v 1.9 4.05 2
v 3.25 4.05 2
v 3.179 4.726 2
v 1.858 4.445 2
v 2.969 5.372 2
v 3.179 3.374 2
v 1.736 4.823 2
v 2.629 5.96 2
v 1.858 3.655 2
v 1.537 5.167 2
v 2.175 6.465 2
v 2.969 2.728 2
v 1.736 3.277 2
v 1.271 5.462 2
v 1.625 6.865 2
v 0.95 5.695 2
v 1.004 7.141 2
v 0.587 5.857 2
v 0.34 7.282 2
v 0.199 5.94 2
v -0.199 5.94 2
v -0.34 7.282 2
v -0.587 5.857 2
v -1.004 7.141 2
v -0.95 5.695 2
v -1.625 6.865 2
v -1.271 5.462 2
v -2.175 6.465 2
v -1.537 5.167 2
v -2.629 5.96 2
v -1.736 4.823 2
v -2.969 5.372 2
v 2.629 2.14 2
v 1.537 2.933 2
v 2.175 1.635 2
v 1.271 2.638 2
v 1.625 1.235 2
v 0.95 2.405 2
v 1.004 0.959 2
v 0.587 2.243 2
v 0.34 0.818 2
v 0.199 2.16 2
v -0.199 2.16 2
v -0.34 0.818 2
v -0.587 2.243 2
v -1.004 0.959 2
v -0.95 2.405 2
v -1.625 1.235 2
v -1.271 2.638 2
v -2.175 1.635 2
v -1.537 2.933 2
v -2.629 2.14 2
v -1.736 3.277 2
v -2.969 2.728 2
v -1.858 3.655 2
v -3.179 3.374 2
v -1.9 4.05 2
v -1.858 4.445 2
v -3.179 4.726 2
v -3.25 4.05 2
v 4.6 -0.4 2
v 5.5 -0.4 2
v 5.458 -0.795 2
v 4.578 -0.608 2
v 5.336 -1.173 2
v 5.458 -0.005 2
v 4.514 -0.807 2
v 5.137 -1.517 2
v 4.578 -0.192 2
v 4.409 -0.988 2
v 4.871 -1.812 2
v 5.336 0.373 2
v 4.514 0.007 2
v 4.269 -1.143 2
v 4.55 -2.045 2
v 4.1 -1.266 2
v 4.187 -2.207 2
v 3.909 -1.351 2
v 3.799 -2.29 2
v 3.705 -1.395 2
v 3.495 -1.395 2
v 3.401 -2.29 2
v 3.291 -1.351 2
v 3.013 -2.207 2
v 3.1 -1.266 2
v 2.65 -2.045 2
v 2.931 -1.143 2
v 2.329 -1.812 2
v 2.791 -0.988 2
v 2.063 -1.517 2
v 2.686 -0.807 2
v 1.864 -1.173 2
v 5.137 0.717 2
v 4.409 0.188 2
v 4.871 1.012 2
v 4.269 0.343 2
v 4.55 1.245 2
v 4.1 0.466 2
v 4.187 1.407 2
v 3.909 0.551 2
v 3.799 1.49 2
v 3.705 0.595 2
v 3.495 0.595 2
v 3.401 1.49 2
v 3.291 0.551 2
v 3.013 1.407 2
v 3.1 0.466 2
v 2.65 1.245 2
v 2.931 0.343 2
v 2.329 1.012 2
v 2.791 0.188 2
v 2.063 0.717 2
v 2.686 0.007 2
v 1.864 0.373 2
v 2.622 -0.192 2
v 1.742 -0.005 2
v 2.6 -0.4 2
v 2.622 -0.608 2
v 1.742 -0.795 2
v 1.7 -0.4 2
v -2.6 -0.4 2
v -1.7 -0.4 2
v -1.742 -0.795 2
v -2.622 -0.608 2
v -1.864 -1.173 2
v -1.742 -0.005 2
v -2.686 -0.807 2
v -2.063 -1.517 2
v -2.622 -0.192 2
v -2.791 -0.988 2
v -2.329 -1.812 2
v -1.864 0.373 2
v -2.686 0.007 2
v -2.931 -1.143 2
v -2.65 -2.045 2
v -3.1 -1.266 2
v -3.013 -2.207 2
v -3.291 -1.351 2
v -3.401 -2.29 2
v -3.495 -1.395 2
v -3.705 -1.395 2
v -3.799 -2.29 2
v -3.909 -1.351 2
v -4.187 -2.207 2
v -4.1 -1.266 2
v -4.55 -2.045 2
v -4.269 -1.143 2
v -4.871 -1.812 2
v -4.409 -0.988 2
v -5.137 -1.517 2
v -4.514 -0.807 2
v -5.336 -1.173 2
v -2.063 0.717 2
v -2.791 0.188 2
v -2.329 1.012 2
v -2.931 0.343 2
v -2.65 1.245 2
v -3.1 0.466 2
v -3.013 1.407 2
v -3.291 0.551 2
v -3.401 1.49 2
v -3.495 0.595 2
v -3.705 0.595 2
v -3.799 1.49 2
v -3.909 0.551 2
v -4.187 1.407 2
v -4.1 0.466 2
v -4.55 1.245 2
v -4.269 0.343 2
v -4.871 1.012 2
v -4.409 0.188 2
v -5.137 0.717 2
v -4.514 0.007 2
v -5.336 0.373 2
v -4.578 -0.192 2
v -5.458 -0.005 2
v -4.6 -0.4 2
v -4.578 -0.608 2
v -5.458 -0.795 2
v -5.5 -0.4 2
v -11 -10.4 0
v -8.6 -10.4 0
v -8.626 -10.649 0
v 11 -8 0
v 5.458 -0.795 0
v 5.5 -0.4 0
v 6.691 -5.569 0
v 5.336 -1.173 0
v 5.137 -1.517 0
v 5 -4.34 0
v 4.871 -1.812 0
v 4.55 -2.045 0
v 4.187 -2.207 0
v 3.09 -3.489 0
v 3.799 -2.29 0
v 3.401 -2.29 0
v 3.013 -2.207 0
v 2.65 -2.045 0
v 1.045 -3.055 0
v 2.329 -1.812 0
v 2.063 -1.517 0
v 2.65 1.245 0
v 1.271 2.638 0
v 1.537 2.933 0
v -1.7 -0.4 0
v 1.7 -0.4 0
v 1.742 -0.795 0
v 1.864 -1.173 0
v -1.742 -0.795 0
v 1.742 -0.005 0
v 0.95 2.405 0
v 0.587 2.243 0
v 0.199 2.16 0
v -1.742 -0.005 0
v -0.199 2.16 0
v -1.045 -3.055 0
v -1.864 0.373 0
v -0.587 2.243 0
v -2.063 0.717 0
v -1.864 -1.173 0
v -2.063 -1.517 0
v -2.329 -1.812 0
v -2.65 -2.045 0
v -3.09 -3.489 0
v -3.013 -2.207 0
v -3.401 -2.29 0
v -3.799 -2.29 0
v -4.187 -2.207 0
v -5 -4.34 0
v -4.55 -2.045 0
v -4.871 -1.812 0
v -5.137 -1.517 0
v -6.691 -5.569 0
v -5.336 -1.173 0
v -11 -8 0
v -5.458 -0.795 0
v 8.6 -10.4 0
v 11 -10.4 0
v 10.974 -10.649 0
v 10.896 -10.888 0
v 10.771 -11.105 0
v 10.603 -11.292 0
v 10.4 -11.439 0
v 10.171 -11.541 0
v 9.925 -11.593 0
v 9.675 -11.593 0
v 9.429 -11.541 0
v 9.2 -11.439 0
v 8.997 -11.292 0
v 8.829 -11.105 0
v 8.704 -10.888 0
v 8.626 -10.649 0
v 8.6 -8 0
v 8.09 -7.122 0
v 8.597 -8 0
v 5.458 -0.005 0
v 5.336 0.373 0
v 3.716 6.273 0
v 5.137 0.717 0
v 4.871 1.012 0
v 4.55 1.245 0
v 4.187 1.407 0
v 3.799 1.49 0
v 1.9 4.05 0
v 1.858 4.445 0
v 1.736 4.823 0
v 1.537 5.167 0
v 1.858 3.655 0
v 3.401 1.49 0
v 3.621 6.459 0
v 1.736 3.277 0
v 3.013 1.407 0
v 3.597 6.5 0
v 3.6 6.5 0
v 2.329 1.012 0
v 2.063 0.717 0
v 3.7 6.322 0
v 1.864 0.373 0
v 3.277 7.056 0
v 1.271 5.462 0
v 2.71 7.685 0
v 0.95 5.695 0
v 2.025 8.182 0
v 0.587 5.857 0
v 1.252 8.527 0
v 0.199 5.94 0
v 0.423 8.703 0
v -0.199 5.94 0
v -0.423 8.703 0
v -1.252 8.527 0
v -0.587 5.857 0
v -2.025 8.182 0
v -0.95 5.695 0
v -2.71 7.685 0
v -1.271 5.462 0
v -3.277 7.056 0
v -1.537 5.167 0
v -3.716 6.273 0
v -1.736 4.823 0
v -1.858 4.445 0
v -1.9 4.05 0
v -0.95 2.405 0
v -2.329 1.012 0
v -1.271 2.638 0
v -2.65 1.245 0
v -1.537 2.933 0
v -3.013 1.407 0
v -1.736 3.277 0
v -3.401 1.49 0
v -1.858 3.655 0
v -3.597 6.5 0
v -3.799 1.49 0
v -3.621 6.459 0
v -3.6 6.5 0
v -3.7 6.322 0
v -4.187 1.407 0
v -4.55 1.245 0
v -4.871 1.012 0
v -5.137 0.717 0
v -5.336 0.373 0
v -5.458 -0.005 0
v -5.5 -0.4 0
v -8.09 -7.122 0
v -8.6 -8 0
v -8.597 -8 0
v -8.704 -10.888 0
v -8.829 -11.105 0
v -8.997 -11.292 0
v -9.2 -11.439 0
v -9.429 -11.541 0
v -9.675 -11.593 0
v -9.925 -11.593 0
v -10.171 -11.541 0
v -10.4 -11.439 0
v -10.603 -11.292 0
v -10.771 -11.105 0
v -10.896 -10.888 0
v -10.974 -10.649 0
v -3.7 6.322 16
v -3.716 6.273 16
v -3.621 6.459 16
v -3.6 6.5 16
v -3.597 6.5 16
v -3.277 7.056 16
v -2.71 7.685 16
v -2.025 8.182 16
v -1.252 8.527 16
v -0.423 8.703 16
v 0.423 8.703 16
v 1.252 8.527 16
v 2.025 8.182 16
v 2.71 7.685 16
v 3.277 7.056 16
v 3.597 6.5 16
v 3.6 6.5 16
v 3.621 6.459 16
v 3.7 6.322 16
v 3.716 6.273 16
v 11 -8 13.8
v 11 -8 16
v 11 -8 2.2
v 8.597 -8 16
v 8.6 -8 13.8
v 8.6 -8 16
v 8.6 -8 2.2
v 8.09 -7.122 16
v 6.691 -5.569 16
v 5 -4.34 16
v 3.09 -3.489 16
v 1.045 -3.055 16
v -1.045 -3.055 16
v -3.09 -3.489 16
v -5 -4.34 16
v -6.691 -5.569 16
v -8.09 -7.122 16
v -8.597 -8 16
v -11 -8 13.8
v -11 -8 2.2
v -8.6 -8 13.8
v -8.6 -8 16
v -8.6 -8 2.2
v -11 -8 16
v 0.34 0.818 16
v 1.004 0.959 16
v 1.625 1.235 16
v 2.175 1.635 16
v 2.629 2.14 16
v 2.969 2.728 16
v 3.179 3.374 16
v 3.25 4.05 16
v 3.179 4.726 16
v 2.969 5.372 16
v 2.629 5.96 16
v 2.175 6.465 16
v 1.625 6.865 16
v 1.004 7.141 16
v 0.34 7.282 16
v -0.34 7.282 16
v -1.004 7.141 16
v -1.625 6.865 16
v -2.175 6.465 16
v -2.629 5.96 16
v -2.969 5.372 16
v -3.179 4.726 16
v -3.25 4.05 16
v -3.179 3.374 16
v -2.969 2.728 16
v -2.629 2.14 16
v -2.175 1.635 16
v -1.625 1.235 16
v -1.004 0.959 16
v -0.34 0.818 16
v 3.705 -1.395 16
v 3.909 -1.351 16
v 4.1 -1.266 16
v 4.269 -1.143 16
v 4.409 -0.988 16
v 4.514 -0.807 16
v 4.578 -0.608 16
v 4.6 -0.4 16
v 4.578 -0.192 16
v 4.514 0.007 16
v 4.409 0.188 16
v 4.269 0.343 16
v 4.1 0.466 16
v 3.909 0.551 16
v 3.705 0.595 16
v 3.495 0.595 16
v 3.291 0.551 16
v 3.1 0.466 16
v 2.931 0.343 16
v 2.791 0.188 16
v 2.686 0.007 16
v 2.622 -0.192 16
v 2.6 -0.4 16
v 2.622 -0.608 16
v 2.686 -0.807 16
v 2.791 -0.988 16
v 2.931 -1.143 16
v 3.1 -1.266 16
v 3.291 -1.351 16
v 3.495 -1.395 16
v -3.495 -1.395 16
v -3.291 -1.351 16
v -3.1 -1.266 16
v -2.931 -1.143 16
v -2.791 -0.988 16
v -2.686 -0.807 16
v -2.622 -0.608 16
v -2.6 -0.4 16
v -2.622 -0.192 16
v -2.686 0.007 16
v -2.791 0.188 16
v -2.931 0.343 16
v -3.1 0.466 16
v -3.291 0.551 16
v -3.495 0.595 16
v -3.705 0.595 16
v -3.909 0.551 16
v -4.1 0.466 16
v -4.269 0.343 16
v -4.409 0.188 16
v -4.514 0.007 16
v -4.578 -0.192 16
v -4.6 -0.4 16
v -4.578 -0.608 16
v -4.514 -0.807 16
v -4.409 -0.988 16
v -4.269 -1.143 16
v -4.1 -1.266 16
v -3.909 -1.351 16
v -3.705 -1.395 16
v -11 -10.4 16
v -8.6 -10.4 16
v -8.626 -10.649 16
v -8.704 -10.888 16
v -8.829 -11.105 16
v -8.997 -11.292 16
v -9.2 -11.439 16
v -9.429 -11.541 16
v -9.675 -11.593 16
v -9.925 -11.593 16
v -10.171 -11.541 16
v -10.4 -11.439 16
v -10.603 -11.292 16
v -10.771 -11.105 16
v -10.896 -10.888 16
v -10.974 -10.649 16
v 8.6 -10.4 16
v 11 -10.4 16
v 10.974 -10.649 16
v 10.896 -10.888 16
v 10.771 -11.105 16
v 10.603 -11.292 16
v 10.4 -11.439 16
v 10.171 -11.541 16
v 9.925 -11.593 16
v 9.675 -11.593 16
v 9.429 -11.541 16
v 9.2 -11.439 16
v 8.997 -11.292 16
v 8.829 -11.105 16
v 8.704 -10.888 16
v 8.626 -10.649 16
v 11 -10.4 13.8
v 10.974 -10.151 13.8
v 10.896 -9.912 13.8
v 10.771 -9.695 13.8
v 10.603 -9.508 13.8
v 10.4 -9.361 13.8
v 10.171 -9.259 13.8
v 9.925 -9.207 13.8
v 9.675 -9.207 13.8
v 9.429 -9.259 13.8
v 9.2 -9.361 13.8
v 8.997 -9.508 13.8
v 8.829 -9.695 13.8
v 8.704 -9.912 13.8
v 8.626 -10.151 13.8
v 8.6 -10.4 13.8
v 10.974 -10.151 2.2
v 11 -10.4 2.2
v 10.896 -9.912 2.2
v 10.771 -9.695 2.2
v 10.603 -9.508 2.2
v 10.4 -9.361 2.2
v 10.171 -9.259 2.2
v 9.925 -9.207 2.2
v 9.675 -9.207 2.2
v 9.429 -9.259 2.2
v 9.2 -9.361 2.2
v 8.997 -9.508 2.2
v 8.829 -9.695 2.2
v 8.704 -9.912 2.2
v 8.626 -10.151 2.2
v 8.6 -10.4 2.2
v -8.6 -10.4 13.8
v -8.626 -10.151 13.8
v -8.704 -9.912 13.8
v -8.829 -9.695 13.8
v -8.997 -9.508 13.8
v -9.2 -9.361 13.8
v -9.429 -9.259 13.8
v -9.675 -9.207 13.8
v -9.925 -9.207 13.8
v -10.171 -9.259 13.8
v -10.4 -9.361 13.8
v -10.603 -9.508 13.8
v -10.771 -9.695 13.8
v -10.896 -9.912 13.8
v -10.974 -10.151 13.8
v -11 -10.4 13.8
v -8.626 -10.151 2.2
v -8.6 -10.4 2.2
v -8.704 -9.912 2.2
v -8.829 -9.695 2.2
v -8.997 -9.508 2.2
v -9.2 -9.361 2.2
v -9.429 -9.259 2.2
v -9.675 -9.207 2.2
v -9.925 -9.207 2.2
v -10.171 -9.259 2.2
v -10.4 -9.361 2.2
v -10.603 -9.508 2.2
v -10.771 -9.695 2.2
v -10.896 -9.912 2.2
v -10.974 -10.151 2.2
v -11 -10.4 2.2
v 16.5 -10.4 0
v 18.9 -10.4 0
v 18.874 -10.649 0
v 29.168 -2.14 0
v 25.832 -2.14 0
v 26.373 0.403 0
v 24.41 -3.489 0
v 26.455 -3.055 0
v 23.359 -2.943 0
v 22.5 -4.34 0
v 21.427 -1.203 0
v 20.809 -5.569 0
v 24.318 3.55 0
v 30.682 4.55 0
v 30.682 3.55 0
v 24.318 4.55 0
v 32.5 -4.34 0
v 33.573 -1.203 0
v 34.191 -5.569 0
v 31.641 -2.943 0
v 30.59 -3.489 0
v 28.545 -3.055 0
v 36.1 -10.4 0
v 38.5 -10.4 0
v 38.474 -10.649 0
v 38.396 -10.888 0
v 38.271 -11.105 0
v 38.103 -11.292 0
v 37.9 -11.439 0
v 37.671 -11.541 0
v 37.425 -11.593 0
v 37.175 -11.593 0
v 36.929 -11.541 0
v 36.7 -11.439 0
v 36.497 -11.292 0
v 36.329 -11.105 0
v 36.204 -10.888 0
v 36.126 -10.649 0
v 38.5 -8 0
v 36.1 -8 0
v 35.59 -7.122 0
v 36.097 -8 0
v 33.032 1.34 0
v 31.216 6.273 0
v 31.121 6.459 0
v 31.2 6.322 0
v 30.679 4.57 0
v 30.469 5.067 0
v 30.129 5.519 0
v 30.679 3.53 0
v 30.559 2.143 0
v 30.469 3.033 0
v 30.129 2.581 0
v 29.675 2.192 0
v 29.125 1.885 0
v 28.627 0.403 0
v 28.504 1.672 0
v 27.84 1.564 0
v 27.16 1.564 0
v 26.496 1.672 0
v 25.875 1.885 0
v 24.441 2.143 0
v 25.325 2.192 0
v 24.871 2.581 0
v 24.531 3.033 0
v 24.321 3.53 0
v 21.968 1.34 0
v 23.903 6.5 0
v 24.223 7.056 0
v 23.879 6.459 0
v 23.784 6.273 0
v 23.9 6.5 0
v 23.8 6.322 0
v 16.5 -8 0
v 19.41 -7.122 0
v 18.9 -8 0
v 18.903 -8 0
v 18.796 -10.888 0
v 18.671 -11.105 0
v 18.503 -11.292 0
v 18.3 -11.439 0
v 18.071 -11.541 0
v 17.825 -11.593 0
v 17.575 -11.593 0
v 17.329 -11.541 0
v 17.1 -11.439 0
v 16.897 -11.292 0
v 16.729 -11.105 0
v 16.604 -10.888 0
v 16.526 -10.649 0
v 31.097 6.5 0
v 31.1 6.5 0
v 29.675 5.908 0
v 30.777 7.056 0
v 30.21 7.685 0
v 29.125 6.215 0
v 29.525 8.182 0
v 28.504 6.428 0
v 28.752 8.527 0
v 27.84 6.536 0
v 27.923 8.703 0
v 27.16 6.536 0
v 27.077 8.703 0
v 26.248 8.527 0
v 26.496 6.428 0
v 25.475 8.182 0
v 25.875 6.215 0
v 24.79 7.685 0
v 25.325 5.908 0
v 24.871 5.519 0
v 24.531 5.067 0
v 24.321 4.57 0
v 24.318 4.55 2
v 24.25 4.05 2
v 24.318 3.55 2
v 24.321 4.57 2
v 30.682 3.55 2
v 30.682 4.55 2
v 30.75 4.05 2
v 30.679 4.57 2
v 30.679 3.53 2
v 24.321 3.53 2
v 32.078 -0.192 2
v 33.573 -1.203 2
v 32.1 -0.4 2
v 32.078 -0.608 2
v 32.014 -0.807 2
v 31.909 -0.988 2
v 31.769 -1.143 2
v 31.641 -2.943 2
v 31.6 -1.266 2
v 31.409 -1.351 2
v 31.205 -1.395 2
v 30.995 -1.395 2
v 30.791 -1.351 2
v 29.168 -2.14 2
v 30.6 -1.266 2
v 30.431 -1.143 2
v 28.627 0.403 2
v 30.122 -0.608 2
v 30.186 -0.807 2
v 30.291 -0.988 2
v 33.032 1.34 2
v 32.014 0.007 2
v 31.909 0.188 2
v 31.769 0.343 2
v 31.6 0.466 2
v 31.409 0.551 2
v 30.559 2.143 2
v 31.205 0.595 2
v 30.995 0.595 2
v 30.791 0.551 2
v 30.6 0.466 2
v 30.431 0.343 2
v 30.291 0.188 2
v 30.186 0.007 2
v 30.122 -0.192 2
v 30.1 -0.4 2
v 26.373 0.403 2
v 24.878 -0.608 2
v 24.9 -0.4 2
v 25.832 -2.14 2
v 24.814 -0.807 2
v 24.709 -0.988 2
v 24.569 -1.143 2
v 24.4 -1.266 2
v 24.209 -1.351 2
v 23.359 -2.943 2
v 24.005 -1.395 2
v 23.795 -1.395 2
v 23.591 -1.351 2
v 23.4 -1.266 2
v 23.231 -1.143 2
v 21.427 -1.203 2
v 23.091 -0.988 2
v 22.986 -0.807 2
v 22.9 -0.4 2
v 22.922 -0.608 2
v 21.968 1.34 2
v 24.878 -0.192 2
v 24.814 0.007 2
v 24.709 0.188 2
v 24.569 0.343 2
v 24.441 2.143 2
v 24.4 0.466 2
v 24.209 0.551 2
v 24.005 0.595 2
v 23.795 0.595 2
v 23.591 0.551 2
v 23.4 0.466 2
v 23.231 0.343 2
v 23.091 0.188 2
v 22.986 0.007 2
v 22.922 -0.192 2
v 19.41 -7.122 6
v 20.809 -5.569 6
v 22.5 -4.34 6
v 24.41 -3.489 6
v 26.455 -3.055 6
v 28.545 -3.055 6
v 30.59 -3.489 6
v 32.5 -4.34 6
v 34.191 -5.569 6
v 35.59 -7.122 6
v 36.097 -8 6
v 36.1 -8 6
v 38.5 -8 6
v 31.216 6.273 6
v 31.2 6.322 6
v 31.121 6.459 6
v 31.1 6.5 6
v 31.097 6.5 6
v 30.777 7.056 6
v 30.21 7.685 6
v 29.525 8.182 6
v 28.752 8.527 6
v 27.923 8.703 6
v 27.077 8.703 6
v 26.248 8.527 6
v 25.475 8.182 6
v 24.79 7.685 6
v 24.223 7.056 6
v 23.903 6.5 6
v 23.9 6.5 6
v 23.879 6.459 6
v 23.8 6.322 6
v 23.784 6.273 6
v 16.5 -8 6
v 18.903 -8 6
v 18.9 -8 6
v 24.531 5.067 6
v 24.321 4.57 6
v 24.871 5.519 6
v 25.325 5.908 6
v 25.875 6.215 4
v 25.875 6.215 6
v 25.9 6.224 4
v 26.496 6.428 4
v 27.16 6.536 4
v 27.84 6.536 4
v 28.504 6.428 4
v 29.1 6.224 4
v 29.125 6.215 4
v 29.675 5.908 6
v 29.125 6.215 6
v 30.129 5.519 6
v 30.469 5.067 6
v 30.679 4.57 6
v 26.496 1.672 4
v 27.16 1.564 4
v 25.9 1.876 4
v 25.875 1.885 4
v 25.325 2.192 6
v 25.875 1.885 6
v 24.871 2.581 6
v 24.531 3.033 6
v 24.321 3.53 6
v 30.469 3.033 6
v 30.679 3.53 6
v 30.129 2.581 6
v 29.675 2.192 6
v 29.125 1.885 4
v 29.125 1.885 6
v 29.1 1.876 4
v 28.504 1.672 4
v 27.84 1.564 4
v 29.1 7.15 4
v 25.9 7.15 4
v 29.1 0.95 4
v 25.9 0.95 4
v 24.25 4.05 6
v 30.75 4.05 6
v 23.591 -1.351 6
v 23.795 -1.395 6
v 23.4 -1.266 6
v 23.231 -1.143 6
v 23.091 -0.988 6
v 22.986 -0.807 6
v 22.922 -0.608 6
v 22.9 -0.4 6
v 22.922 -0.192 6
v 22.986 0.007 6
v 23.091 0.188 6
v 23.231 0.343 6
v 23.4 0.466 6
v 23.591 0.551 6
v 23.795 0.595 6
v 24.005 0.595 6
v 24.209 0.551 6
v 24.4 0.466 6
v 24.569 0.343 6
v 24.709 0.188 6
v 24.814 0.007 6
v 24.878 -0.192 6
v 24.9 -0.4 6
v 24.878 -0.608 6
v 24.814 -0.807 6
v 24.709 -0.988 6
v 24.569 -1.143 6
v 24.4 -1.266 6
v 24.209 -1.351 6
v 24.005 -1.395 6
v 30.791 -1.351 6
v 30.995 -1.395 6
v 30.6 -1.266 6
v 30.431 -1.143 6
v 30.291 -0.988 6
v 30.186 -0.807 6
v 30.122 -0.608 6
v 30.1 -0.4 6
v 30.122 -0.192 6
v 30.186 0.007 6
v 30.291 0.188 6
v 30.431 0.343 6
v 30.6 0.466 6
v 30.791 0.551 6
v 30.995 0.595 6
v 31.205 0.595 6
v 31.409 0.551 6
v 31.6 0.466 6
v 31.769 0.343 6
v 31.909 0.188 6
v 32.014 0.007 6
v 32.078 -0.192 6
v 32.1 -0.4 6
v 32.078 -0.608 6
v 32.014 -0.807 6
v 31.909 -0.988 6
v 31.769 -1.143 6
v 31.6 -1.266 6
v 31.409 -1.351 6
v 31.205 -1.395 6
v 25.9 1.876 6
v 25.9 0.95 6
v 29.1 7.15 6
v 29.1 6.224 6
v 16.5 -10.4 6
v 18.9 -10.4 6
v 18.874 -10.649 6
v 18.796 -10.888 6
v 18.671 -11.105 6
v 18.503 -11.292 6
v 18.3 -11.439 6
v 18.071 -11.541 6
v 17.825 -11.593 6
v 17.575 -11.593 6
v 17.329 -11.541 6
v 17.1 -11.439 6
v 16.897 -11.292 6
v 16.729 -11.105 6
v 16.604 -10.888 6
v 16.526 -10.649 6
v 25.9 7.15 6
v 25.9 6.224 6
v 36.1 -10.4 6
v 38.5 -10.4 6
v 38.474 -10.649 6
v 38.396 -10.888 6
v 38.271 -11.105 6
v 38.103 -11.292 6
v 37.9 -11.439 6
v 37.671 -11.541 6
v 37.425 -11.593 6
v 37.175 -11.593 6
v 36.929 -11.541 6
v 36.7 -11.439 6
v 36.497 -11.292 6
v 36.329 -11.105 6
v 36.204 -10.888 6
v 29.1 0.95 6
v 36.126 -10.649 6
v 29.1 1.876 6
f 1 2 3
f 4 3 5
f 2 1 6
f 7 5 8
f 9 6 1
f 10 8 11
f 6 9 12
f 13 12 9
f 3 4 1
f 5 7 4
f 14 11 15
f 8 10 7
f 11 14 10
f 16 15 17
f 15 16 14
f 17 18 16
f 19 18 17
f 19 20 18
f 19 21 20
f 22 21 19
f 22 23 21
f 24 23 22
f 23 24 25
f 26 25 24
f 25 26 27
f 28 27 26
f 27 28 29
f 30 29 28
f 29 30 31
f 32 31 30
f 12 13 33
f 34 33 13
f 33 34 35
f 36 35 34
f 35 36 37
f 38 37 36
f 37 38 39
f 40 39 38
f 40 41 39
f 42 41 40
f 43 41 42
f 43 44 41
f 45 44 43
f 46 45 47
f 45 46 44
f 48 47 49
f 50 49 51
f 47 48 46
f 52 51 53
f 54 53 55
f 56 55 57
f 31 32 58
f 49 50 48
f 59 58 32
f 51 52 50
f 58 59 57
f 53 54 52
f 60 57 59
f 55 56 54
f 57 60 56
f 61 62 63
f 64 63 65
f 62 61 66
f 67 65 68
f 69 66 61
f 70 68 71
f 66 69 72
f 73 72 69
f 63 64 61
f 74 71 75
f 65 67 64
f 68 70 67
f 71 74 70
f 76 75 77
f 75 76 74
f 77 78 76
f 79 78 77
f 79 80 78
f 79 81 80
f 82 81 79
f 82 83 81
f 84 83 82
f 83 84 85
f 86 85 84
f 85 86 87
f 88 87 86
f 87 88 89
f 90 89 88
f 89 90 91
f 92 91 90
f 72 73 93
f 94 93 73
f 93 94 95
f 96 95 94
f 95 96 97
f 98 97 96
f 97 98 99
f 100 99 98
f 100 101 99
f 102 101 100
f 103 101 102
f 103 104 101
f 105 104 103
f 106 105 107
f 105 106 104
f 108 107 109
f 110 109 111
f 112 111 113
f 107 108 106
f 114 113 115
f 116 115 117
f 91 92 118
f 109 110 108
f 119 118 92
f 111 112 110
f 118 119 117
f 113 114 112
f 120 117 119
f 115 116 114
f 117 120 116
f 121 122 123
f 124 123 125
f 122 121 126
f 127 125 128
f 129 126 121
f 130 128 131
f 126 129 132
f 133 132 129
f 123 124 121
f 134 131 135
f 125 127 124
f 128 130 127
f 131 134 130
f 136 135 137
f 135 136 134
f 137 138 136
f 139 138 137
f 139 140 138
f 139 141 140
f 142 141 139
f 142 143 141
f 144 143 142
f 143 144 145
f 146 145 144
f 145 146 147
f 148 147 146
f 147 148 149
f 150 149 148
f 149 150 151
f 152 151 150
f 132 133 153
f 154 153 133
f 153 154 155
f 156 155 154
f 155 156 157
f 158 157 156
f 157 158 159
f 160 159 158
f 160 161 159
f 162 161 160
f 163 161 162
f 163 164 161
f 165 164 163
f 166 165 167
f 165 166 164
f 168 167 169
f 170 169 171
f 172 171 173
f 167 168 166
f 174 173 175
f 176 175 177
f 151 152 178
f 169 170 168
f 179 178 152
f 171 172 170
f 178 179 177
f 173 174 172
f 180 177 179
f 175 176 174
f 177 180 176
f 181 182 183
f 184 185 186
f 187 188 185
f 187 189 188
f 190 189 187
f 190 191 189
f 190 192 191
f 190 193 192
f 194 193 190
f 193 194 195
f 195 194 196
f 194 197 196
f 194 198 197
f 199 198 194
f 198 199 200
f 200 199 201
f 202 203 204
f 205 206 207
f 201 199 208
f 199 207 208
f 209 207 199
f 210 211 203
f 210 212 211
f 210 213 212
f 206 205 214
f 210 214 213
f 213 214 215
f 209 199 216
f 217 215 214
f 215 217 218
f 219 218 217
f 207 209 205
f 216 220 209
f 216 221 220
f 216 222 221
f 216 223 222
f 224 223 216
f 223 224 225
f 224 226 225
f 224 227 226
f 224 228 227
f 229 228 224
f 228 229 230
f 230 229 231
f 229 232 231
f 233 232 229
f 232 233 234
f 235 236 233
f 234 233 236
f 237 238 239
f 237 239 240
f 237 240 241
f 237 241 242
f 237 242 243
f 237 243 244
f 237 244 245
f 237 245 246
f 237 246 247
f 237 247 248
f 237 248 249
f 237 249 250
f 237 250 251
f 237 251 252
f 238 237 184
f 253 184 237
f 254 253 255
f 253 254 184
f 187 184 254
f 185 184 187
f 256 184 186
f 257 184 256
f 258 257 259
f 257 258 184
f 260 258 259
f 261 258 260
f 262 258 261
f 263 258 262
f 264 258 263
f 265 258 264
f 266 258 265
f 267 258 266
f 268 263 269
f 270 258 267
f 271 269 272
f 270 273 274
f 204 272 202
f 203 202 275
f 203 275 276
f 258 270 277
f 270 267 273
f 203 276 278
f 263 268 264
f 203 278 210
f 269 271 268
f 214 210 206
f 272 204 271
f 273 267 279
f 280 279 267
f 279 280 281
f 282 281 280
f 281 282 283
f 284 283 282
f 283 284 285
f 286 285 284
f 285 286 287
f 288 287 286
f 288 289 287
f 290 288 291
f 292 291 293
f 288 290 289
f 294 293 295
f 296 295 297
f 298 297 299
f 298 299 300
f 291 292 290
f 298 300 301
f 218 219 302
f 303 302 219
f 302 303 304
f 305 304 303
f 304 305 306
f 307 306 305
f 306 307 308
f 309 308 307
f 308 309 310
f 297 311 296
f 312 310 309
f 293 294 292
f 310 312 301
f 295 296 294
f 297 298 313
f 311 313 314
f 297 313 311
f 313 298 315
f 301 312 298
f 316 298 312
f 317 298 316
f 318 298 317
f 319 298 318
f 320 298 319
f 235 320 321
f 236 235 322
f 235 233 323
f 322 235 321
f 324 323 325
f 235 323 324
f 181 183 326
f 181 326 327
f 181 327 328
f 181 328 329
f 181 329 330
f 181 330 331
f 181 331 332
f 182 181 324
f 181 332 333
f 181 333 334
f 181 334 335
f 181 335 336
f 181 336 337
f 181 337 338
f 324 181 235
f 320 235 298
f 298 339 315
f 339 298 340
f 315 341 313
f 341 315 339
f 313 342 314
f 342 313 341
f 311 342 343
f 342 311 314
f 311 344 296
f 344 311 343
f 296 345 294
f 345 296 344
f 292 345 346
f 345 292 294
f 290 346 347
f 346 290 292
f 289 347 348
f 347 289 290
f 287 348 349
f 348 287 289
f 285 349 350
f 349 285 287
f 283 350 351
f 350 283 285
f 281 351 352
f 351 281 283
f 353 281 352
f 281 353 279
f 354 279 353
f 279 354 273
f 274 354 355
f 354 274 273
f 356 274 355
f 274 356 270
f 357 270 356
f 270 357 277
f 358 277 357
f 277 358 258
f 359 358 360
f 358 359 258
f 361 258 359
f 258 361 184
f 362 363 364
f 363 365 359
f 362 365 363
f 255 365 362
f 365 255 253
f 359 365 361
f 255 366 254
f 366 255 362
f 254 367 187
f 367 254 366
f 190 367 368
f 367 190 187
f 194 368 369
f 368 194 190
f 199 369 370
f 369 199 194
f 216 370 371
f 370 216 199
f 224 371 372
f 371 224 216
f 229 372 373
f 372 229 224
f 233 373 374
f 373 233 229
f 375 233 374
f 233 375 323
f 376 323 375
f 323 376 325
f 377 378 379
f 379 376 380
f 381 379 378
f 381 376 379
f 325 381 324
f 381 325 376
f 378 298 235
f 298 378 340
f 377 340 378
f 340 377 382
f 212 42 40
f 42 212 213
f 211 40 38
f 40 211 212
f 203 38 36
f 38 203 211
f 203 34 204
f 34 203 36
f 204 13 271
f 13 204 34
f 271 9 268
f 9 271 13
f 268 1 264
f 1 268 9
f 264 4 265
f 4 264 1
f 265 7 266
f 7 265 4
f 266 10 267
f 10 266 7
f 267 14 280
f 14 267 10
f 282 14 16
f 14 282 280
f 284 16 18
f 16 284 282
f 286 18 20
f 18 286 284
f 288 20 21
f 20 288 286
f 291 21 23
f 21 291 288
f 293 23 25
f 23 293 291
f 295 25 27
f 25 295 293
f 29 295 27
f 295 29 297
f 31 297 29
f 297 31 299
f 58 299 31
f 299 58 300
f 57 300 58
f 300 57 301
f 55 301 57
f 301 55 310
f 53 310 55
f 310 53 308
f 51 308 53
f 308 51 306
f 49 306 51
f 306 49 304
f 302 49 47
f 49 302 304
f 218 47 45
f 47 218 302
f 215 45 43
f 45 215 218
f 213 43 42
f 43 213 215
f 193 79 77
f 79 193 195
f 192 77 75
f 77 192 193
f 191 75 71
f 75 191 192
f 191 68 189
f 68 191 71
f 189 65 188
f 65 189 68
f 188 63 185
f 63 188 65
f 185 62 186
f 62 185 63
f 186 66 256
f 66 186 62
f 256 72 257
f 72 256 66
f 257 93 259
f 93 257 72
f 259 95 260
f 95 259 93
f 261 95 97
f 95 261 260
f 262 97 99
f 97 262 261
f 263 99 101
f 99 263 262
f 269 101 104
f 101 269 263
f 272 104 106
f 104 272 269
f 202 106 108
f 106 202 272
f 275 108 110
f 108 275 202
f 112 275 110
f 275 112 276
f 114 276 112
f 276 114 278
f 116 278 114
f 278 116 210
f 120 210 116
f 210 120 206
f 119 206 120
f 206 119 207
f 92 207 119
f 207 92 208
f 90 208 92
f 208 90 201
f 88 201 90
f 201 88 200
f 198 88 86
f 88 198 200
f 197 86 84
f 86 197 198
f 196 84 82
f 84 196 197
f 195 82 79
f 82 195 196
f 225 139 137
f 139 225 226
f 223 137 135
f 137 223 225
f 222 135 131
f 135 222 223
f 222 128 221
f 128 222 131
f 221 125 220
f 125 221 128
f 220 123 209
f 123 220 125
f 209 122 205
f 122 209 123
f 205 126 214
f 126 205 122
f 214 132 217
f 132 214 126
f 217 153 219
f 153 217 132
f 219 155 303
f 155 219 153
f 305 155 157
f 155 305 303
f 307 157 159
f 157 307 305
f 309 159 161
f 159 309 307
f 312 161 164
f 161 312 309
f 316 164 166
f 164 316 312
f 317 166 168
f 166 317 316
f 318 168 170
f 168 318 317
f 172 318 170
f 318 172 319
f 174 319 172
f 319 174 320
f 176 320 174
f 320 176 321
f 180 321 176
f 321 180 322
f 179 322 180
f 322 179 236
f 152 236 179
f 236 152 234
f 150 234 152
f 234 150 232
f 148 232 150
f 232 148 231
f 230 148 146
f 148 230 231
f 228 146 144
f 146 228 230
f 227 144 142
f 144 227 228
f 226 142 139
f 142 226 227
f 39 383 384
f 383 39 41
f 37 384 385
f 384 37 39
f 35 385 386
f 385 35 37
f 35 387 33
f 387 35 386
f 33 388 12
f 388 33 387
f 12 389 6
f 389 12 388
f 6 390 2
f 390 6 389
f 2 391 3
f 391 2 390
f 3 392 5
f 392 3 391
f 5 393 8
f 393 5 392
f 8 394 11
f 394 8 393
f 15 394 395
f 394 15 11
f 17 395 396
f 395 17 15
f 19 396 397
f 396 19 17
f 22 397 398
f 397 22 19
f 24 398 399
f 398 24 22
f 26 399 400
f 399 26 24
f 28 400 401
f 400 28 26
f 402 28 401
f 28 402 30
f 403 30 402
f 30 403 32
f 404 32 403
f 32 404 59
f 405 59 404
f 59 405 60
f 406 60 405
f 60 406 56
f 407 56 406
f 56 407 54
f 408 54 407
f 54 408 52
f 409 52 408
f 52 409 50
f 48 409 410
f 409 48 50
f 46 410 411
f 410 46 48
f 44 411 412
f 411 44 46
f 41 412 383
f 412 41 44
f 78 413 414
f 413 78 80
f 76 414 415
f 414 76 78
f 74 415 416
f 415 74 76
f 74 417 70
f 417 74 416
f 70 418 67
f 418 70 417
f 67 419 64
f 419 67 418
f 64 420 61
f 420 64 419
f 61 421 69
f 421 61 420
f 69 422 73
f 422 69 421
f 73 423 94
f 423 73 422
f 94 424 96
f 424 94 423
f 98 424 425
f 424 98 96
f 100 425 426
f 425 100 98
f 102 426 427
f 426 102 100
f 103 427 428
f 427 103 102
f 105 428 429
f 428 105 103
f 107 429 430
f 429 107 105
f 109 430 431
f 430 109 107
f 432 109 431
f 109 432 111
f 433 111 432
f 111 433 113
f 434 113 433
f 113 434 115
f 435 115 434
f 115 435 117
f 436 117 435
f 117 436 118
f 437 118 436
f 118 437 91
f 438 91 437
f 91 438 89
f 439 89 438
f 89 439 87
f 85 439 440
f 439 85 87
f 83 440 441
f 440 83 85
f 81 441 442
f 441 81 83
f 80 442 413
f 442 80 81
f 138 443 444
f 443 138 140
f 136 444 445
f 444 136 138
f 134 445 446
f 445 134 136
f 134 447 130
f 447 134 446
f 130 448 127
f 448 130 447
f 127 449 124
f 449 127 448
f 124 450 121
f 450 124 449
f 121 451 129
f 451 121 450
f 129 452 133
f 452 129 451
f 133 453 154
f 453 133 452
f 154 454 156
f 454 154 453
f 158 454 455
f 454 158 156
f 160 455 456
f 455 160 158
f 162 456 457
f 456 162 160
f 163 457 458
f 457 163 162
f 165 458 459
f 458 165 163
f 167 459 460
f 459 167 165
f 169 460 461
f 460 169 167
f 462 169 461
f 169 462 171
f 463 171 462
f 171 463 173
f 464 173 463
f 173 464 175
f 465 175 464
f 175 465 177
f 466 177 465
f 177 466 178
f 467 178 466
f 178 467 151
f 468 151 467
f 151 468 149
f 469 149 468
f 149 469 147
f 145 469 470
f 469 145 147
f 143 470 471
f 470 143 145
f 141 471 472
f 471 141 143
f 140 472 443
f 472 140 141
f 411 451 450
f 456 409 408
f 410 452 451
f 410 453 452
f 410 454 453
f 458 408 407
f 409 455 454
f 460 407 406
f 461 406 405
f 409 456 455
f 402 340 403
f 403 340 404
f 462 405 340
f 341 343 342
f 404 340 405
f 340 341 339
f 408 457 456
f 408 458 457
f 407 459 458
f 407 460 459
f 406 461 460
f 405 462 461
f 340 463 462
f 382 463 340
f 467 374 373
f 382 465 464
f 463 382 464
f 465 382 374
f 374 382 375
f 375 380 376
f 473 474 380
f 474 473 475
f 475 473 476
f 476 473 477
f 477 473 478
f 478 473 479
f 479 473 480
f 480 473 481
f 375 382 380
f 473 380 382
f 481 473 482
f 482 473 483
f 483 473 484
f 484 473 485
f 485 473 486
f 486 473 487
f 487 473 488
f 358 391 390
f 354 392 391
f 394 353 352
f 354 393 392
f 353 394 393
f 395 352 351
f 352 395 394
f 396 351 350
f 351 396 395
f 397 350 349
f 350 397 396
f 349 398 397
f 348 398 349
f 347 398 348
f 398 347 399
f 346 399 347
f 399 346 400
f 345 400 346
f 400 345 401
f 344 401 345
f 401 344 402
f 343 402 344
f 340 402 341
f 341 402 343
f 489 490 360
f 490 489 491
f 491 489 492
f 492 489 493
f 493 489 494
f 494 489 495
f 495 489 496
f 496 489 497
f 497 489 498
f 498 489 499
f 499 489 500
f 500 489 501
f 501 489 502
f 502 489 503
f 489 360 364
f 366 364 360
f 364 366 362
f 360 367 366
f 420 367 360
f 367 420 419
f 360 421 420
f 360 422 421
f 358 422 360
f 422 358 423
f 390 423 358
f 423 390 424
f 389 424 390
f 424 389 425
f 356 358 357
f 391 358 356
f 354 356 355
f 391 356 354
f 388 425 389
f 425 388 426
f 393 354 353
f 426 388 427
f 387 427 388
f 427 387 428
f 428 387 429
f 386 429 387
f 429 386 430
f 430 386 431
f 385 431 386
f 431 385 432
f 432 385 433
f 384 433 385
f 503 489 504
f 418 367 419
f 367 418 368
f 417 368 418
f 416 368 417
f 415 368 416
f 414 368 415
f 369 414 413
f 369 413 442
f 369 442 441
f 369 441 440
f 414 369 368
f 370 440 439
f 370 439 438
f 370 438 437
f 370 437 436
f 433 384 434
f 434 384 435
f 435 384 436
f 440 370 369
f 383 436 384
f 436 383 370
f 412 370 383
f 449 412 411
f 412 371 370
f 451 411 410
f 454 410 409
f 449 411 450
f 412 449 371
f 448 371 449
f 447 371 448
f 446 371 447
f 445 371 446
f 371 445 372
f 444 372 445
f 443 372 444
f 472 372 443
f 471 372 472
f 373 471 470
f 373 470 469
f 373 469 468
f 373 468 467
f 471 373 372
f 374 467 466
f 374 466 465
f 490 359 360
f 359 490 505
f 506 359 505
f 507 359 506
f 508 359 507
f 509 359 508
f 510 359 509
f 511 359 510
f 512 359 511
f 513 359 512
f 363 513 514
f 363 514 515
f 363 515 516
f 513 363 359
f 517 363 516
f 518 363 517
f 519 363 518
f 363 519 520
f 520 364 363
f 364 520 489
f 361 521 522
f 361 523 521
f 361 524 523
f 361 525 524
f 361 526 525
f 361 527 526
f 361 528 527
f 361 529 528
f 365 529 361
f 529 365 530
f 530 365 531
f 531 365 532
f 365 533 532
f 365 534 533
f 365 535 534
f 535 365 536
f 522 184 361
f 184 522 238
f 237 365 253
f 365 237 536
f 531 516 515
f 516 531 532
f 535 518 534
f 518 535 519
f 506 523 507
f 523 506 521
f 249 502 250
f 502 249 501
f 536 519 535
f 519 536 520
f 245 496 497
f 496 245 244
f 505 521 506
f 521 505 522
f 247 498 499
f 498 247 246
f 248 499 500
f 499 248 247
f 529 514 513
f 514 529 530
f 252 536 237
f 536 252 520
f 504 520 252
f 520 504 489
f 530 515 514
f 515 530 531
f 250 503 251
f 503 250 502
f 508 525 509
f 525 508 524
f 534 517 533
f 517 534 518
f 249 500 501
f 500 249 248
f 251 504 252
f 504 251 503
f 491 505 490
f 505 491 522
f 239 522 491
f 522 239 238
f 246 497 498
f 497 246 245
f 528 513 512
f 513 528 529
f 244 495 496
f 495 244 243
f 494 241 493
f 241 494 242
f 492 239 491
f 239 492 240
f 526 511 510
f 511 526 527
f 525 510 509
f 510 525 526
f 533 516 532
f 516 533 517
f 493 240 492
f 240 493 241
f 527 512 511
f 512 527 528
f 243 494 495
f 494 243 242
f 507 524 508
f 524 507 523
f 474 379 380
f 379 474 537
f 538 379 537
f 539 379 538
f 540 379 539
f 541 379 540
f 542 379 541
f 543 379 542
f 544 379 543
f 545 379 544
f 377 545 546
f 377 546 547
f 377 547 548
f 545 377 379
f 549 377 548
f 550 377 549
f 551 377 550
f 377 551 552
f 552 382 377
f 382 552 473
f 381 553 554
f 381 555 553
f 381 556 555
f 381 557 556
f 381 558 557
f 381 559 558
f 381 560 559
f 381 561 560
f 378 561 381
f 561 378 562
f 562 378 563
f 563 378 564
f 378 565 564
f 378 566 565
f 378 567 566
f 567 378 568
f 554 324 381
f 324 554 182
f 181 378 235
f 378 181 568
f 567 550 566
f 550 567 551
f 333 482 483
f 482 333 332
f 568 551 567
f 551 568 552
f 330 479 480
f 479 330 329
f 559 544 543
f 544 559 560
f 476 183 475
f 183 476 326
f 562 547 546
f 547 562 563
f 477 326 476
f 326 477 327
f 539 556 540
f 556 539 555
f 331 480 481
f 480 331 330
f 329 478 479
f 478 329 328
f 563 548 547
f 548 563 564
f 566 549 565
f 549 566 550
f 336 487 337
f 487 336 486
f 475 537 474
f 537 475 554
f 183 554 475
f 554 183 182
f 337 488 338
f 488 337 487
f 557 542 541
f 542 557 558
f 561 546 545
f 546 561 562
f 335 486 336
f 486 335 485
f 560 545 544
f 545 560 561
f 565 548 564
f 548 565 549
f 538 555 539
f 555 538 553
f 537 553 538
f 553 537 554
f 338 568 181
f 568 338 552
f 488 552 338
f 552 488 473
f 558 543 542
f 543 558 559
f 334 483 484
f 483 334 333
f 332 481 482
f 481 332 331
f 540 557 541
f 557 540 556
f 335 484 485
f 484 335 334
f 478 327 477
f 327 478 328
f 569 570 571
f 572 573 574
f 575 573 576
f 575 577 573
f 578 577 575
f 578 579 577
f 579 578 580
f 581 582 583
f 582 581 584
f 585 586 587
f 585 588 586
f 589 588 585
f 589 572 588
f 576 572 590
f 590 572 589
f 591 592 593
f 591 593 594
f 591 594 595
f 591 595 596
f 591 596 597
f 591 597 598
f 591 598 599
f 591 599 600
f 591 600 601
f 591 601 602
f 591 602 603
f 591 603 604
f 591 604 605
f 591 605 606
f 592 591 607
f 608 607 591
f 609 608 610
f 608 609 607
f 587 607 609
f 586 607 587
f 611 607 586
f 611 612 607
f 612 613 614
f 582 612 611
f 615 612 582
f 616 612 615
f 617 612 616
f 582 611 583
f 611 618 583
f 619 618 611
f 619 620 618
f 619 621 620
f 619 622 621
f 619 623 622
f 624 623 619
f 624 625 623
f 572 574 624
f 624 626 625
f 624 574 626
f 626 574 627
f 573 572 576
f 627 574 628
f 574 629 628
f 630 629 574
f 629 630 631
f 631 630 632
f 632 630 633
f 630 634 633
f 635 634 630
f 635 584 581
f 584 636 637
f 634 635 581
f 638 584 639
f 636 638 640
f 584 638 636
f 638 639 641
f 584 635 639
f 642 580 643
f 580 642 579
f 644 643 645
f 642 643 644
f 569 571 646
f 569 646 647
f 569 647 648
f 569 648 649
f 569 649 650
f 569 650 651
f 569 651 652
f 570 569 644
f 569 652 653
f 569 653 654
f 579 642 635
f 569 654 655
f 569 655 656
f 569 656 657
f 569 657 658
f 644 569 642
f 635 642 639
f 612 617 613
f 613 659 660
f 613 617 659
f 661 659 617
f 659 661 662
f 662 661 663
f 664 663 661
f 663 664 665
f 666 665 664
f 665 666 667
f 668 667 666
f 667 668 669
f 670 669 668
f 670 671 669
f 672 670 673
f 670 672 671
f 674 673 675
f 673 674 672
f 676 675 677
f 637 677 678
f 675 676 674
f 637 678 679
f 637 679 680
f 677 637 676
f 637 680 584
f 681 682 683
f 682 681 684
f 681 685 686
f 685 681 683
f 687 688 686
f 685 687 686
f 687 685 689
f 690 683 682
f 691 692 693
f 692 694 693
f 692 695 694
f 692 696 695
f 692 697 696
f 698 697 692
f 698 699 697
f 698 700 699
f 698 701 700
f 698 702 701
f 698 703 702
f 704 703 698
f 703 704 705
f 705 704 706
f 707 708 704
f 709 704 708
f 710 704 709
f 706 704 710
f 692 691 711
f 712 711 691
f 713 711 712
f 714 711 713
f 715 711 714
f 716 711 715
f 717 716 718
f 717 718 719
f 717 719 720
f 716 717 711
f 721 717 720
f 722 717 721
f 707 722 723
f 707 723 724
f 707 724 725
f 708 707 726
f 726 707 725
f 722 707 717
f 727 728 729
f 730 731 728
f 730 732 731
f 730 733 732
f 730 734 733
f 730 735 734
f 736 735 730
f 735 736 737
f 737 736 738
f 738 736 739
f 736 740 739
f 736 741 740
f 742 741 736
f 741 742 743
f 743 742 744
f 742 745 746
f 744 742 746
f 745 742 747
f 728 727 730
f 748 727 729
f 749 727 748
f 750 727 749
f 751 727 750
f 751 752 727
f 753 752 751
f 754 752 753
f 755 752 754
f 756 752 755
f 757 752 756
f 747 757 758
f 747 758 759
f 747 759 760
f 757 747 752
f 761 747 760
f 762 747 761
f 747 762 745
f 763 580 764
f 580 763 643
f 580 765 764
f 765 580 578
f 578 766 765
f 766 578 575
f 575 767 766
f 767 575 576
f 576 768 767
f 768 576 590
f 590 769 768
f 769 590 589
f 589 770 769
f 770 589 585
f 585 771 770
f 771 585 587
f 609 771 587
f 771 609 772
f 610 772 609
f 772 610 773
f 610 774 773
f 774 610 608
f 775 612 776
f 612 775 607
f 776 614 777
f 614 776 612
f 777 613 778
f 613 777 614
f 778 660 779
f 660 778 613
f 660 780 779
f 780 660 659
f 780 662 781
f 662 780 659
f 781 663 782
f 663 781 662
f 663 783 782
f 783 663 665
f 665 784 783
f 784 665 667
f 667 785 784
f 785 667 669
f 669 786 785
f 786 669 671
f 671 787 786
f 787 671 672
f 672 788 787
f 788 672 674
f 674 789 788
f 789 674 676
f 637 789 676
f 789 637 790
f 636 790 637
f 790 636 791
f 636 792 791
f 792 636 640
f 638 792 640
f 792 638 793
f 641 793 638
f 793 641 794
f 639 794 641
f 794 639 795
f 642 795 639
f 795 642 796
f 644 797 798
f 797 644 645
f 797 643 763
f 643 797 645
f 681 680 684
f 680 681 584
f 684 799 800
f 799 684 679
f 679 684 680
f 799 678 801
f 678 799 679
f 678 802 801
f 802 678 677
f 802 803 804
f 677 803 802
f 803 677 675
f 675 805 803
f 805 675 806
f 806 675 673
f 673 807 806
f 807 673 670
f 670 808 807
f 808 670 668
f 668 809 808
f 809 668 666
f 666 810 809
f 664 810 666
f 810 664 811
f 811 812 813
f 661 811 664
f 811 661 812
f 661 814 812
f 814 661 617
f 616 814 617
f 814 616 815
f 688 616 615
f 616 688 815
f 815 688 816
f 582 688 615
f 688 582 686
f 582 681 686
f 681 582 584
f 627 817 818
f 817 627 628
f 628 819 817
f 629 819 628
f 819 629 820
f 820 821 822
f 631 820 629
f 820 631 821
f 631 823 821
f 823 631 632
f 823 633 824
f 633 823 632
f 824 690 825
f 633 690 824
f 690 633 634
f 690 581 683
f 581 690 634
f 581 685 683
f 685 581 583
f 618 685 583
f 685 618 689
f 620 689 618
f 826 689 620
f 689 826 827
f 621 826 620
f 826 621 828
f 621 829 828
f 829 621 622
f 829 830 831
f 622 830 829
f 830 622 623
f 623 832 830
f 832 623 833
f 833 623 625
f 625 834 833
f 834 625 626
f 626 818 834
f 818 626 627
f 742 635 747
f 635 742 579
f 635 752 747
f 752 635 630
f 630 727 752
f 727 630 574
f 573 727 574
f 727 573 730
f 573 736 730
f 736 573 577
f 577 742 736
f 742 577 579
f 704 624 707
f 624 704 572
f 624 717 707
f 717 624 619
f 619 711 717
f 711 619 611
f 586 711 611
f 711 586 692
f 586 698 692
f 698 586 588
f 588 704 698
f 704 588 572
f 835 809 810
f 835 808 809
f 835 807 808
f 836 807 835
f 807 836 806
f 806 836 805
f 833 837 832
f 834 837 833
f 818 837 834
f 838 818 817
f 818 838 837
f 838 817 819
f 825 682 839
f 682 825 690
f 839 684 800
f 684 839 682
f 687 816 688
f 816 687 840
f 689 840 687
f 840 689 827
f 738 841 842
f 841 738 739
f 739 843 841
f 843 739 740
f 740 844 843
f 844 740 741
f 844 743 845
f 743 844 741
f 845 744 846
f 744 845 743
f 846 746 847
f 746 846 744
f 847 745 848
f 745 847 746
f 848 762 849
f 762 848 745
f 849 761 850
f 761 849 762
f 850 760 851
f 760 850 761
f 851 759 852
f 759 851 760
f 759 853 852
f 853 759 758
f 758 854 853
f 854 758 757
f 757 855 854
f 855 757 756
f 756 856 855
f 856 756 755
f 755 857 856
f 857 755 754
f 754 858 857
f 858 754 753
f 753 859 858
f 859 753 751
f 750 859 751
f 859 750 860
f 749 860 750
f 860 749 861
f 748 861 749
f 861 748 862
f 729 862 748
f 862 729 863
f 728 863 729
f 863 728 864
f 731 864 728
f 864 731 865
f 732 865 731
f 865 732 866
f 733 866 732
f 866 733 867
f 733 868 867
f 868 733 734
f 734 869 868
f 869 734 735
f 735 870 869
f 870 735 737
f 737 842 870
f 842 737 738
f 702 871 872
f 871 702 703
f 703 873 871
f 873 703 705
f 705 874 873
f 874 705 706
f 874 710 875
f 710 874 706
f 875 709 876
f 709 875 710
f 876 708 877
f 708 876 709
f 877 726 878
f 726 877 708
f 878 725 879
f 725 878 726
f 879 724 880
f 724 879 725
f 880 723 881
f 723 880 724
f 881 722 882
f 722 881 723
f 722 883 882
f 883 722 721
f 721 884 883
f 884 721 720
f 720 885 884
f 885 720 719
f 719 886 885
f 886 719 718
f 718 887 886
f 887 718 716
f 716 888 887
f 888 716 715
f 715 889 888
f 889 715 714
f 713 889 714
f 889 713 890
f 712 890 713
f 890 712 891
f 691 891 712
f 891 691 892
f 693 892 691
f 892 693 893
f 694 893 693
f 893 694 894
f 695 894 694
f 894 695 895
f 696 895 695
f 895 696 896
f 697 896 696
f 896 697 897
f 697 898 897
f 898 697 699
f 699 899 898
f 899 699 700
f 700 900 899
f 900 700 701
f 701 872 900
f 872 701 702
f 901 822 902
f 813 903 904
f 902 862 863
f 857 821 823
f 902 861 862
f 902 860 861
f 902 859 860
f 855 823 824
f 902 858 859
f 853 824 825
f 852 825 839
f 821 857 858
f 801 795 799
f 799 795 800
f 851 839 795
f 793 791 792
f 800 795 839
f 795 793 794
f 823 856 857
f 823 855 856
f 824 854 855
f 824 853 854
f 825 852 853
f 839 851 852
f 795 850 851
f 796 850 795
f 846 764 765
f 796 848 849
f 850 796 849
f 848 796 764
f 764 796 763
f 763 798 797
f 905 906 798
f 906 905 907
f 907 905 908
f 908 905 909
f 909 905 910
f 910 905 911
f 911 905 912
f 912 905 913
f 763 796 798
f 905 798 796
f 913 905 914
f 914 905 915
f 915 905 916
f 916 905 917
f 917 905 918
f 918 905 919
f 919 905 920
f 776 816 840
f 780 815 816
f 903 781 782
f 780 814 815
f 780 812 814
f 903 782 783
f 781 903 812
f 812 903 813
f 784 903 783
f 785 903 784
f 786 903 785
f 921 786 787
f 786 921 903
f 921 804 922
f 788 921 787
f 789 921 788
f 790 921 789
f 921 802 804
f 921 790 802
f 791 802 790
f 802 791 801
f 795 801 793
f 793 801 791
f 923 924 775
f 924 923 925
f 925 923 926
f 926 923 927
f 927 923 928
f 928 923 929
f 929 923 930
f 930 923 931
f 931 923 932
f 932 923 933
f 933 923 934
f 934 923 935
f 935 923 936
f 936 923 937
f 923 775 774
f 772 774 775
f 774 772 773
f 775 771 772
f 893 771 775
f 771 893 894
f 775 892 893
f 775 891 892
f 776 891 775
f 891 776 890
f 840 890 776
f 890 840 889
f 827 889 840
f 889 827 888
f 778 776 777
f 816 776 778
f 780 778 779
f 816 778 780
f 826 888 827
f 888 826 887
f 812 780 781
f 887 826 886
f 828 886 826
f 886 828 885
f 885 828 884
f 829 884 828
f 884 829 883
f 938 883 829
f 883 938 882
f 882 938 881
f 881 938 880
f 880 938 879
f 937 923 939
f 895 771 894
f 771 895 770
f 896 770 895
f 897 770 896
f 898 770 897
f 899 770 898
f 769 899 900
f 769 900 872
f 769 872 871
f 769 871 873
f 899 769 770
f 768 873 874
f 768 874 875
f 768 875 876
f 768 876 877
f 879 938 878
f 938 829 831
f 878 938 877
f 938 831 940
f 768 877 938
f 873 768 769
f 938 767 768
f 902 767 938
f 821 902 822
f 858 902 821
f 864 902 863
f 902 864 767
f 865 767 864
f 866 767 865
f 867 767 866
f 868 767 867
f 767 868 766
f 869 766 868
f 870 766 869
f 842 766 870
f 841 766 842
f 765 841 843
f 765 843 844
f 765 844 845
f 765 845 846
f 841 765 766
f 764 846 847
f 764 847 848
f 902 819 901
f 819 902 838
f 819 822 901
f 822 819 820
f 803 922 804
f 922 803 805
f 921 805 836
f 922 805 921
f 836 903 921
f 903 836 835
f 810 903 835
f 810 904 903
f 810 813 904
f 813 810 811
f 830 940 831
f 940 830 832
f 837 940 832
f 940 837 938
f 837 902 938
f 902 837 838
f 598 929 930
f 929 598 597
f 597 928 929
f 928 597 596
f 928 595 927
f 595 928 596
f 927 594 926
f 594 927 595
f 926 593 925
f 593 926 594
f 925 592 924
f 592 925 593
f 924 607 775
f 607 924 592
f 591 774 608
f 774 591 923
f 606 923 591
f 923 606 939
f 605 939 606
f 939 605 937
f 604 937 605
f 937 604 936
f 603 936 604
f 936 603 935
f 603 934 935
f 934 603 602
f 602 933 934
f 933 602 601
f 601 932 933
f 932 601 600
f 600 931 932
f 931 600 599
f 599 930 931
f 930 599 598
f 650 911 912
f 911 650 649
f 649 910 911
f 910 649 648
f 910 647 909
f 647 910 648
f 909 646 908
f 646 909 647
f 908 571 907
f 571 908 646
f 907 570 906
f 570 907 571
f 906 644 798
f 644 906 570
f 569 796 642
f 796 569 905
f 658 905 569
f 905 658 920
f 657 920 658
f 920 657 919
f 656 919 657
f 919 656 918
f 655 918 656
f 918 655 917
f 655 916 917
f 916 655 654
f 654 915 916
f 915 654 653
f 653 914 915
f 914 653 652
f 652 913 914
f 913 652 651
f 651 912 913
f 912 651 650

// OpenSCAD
//2020-09-16
//Laserclaw.scad
//https://github.com/degenerator0/
//https://www.instructables.com/member/degenerator0/
//https://www.thingiverse.com/degenerator/
//Laser diode chassis for Laserclaw project


$fs=.01;
LASERADJUST=2;
M1BOTTOMADJUST_X=3.6;
M1BOTTOMADJUST_Y=-.4;
BOTTOMCIRCLE=10;
BOTTOMCIRCLEADJUST=-13;
EDGECIRCLE=1;
POLYGON_X=3.6;
POLYGON_Y=6.5;
TRAPEZOID_X=11;
TRAPEZOID_Y=-8;
TOPCIRCLE=POLYGON_Y/2+.8;
TOPCIRCLEADJUST=POLYGON_Y/4+1.8;
FRONT_H=16;


module laserfront (){
    hole0_d=3.8;
    hole1_d=3.8;
    hole2_d=6.5;
    screwhead_d=3.8;
    segment0_h=2;
    segment1_h=2;
    segment2_h=12;
    total_h=segment0_h+segment1_h+segment2_h;
    strap_x=2.4;
    strap_y=2.4;
    strap_z=2.2;
    
    union () {
        //segment0
        translate ([0,0,segment1_h+segment2_h])
            linear_extrude(height = segment0_h) {
                difference (){
                    union () {
                        
                        //rounded top
                        translate ([0,2*TOPCIRCLE-TOPCIRCLEADJUST]) circle (TOPCIRCLE);
                        
                        //trapezoid base
                        polygon ([
                            [-POLYGON_X,POLYGON_Y],
                            [POLYGON_X,POLYGON_Y],
                            [TRAPEZOID_X, TRAPEZOID_Y],
                            [-TRAPEZOID_X, TRAPEZOID_Y]]);  
                    
                        }
                        
                //cutouts
                    //laser module hole
                    translate ([0,LASERADJUST*TOPCIRCLE/2]) circle (hole0_d/2);
                        
                    //finger curvature
                    translate ([0,BOTTOMCIRCLEADJUST]) circle (BOTTOMCIRCLE);
                    
                    //m2 screwhead - left
                    translate ([-M1BOTTOMADJUST_X,M1BOTTOMADJUST_Y]) circle(screwhead_d/2);
                        
                    //m2 screwhead - right
                    translate ([M1BOTTOMADJUST_X,M1BOTTOMADJUST_Y]) circle(screwhead_d/2);
                }
            }   
        //segment 1
        translate ([0,0,segment2_h])
            linear_extrude(height = segment1_h) {
                difference (){
                    union () {
                        
                        //rounded top
                        translate ([0,2*TOPCIRCLE-TOPCIRCLEADJUST]) circle (TOPCIRCLE);
                        
                        //trapezoid base
                        polygon ([
                            [-POLYGON_X,POLYGON_Y],
                            [POLYGON_X,POLYGON_Y],
                            [TRAPEZOID_X, TRAPEZOID_Y],
                            [-TRAPEZOID_X, TRAPEZOID_Y]]);  
                   
                        }
                //cutouts
                    //laser module hole
                    translate ([0,LASERADJUST*TOPCIRCLE/2]) circle (hole2_d/2);
                    
                    //finger curvature
                    translate ([0,BOTTOMCIRCLEADJUST]) circle (BOTTOMCIRCLE);
                    
                    //m2 screw - left
                    translate ([-M1BOTTOMADJUST_X,M1BOTTOMADJUST_Y]) circle(1);
                    
                    //m2 screw - RIGHT
                    translate ([M1BOTTOMADJUST_X,M1BOTTOMADJUST_Y]) circle(1);
                }
            }   
        //segment 2
        translate ([0,0,0])
            linear_extrude(height = segment2_h) {
                difference (){
                    union () {
                        
                        //rounded top
                        translate ([0,2*TOPCIRCLE-TOPCIRCLEADJUST]) circle (TOPCIRCLE);
                        
                        //trapezoid base
                        polygon ([
                        [-POLYGON_X,POLYGON_Y],
                            [POLYGON_X,POLYGON_Y],
                            [TRAPEZOID_X, TRAPEZOID_Y],
                            [-TRAPEZOID_X, TRAPEZOID_Y]]);  
                   
                        }
                //cutouts
                    //laser module hole
                    translate ([0,LASERADJUST*TOPCIRCLE/2]) circle (hole2_d/2);
                    
                    //finger curvature
                    translate ([0,BOTTOMCIRCLEADJUST]) circle (BOTTOMCIRCLE);
                    
                    //m2 screw - left
                    translate ([-M1BOTTOMADJUST_X,M1BOTTOMADJUST_Y]) circle(1);
                    
                    //m2 screw - RIGHT
                    translate ([M1BOTTOMADJUST_X,M1BOTTOMADJUST_Y]) circle(1);
                }  
            } 
           
        //strap holder0
        translate ([-TRAPEZOID_X,TRAPEZOID_Y-strap_y])
            linear_extrude(height = strap_z) {
                square (size = [strap_x,strap_y]);
            }
            
        translate ([-TRAPEZOID_X,TRAPEZOID_Y-strap_y,total_h-strap_z])
            linear_extrude(height = strap_z) {
                square (size = [strap_x,strap_y]);
            }
            
        translate ([-TRAPEZOID_X+strap_x/2,TRAPEZOID_Y-strap_y])
            linear_extrude(height = total_h) {
              circle (strap_x/2);
                           }   

        //strap holder1
        translate ([TRAPEZOID_X-strap_x,TRAPEZOID_Y-strap_y])
            linear_extrude(height = strap_z) {
                square (size = [strap_x,strap_y]);
            }
            
        translate ([TRAPEZOID_X-strap_x,TRAPEZOID_Y-strap_y,total_h-strap_z])
            linear_extrude(height = strap_z) {
                square (size = [strap_x,strap_y]);
            }
            
        translate ([TRAPEZOID_X-strap_x/2,TRAPEZOID_Y-strap_y])
            linear_extrude(height = total_h) {
                circle (strap_x/2);
            }
            
    }
}

module laserwires (){  
    hole0_d=5;
    hex_d=5.2;
    rectangle_h=3.2;
    rectangle_w=6.2;
    segment0_h=2;
    segment1_h=2;
    segment2_h=2;
    total_h=6;
    strap_x=2.4;
    strap_y=2.4;
    strap_z=2.2;
       
    union () {
        //segment 0
        translate ([0,0,0])
            linear_extrude(height = segment0_h) {
                difference (){
                    union () {
                        //rounded top
                        translate ([0,2*TOPCIRCLE-TOPCIRCLEADJUST]) 
                            circle (TOPCIRCLE);
                        //trapezoid base
                        polygon ([
                            [-POLYGON_X,POLYGON_Y],
                            [POLYGON_X,POLYGON_Y],
                            [TRAPEZOID_X, TRAPEZOID_Y],
                            [-TRAPEZOID_X, TRAPEZOID_Y]]);
                     
                     }
                     
                    //laser module hole
                    translate ([0,LASERADJUST*TOPCIRCLE/2]) 
                        scale([1.3,1])circle (hole0_d/2);
                    //finger curvature
                    translate ([0,BOTTOMCIRCLEADJUST]) 
                        circle (BOTTOMCIRCLE);
       
                    //m2 screw - left
                    translate ([-M1BOTTOMADJUST_X,M1BOTTOMADJUST_Y])
                        rotate ([0,0,18])
                            circle(r=2.6, $fn=6);
                    //m2 screw - RIGHT
                    translate ([M1BOTTOMADJUST_X,M1BOTTOMADJUST_Y]) 
                        rotate ([0,0,-18]) 
                            circle(r=2.6, $fn=6);
    }
            //strain relief
                translate ([0,LASERADJUST*TOPCIRCLE/2]) 
                    square ([rectangle_w+2,1], center=true); 
    
}  
 
    
        //segment 1
        translate ([0,0,segment0_h])
            linear_extrude(height = segment1_h) {    
                difference (){
                    union () {
                        //rounded top
                        translate ([0,2*TOPCIRCLE-TOPCIRCLEADJUST]) 
                            circle (TOPCIRCLE);
                        //trapezoid base
                        polygon ([
                                [-POLYGON_X,POLYGON_Y],
                                [POLYGON_X,POLYGON_Y],
                                [TRAPEZOID_X, TRAPEZOID_Y],
                                [-TRAPEZOID_X, TRAPEZOID_Y]]);  
                      
                    }
                
                    //cutouts
                        //laser module hole
                        translate ([0,LASERADJUST*TOPCIRCLE/2]) 
                            scale([1.3,1])
                                circle (hole0_d/2);
                    
                        //finger curvature
                        translate ([0,BOTTOMCIRCLEADJUST]) 
                            circle (BOTTOMCIRCLE);
                          
                        //m2 screw - left
                        translate ([-M1BOTTOMADJUST_X,M1BOTTOMADJUST_Y]) 
                            circle(1);
                        
                        //m2 screw - RIGHT
                        translate ([M1BOTTOMADJUST_X,M1BOTTOMADJUST_Y]) 
                            circle(1);   
                }
            
            }
        
        //segment 2
        translate ([0,0,segment0_h+segment1_h])
            linear_extrude(height = segment2_h) {    
                difference (){
                   union () {
                        //rounded top
                        translate ([0,2*TOPCIRCLE-TOPCIRCLEADJUST]) 
                            circle (TOPCIRCLE);
                        //trapezoid base
                        polygon ([
                                [-POLYGON_X,POLYGON_Y],
                                [POLYGON_X,POLYGON_Y],
                                [TRAPEZOID_X, TRAPEZOID_Y],
                                [-TRAPEZOID_X, TRAPEZOID_Y]]);  
                       
                    }
                    
                    //cutouts
                        //laser module wire connector            
                        translate ([0,LASERADJUST*TOPCIRCLE/2]) 
                            square ([rectangle_h,rectangle_w], center=true);
                    
                     //laser module hole
                        translate ([0,LASERADJUST*TOPCIRCLE/2]) 
                            scale([1.3,1])
                                circle (hole0_d/2);
                        //finger curvature
                        translate ([0,BOTTOMCIRCLEADJUST]) 
                            circle (BOTTOMCIRCLE);
                        
                        //m2 screw - left
                        translate ([-M1BOTTOMADJUST_X,M1BOTTOMADJUST_Y]) 
                            circle(1);
                    
                        //m2 screw - RIGHT
                        translate ([M1BOTTOMADJUST_X,M1BOTTOMADJUST_Y]) 
                            circle(1);           
                } 
            }
        //rounded bottom
        linear_extrude(height = total_h) {
            translate ([TRAPEZOID_X-strap_x,TRAPEZOID_Y-strap_y])
                square (size = [strap_x,strap_y]);
        
            translate ([TRAPEZOID_X-strap_x/2,TRAPEZOID_Y-strap_y])
                circle (strap_x/2);
                
            translate ([-TRAPEZOID_X,TRAPEZOID_Y-strap_y])
                square (size = [strap_x,strap_y]);
            
            translate ([-TRAPEZOID_X+strap_x/2,TRAPEZOID_Y-strap_y])
                circle (strap_x/2);
        }
    }
    
}

translate ([0,0,FRONT_H]) rotate ([0,180,0]) laserfront ();
translate ([2.5*TRAPEZOID_X,0]) 
laserwires ();
